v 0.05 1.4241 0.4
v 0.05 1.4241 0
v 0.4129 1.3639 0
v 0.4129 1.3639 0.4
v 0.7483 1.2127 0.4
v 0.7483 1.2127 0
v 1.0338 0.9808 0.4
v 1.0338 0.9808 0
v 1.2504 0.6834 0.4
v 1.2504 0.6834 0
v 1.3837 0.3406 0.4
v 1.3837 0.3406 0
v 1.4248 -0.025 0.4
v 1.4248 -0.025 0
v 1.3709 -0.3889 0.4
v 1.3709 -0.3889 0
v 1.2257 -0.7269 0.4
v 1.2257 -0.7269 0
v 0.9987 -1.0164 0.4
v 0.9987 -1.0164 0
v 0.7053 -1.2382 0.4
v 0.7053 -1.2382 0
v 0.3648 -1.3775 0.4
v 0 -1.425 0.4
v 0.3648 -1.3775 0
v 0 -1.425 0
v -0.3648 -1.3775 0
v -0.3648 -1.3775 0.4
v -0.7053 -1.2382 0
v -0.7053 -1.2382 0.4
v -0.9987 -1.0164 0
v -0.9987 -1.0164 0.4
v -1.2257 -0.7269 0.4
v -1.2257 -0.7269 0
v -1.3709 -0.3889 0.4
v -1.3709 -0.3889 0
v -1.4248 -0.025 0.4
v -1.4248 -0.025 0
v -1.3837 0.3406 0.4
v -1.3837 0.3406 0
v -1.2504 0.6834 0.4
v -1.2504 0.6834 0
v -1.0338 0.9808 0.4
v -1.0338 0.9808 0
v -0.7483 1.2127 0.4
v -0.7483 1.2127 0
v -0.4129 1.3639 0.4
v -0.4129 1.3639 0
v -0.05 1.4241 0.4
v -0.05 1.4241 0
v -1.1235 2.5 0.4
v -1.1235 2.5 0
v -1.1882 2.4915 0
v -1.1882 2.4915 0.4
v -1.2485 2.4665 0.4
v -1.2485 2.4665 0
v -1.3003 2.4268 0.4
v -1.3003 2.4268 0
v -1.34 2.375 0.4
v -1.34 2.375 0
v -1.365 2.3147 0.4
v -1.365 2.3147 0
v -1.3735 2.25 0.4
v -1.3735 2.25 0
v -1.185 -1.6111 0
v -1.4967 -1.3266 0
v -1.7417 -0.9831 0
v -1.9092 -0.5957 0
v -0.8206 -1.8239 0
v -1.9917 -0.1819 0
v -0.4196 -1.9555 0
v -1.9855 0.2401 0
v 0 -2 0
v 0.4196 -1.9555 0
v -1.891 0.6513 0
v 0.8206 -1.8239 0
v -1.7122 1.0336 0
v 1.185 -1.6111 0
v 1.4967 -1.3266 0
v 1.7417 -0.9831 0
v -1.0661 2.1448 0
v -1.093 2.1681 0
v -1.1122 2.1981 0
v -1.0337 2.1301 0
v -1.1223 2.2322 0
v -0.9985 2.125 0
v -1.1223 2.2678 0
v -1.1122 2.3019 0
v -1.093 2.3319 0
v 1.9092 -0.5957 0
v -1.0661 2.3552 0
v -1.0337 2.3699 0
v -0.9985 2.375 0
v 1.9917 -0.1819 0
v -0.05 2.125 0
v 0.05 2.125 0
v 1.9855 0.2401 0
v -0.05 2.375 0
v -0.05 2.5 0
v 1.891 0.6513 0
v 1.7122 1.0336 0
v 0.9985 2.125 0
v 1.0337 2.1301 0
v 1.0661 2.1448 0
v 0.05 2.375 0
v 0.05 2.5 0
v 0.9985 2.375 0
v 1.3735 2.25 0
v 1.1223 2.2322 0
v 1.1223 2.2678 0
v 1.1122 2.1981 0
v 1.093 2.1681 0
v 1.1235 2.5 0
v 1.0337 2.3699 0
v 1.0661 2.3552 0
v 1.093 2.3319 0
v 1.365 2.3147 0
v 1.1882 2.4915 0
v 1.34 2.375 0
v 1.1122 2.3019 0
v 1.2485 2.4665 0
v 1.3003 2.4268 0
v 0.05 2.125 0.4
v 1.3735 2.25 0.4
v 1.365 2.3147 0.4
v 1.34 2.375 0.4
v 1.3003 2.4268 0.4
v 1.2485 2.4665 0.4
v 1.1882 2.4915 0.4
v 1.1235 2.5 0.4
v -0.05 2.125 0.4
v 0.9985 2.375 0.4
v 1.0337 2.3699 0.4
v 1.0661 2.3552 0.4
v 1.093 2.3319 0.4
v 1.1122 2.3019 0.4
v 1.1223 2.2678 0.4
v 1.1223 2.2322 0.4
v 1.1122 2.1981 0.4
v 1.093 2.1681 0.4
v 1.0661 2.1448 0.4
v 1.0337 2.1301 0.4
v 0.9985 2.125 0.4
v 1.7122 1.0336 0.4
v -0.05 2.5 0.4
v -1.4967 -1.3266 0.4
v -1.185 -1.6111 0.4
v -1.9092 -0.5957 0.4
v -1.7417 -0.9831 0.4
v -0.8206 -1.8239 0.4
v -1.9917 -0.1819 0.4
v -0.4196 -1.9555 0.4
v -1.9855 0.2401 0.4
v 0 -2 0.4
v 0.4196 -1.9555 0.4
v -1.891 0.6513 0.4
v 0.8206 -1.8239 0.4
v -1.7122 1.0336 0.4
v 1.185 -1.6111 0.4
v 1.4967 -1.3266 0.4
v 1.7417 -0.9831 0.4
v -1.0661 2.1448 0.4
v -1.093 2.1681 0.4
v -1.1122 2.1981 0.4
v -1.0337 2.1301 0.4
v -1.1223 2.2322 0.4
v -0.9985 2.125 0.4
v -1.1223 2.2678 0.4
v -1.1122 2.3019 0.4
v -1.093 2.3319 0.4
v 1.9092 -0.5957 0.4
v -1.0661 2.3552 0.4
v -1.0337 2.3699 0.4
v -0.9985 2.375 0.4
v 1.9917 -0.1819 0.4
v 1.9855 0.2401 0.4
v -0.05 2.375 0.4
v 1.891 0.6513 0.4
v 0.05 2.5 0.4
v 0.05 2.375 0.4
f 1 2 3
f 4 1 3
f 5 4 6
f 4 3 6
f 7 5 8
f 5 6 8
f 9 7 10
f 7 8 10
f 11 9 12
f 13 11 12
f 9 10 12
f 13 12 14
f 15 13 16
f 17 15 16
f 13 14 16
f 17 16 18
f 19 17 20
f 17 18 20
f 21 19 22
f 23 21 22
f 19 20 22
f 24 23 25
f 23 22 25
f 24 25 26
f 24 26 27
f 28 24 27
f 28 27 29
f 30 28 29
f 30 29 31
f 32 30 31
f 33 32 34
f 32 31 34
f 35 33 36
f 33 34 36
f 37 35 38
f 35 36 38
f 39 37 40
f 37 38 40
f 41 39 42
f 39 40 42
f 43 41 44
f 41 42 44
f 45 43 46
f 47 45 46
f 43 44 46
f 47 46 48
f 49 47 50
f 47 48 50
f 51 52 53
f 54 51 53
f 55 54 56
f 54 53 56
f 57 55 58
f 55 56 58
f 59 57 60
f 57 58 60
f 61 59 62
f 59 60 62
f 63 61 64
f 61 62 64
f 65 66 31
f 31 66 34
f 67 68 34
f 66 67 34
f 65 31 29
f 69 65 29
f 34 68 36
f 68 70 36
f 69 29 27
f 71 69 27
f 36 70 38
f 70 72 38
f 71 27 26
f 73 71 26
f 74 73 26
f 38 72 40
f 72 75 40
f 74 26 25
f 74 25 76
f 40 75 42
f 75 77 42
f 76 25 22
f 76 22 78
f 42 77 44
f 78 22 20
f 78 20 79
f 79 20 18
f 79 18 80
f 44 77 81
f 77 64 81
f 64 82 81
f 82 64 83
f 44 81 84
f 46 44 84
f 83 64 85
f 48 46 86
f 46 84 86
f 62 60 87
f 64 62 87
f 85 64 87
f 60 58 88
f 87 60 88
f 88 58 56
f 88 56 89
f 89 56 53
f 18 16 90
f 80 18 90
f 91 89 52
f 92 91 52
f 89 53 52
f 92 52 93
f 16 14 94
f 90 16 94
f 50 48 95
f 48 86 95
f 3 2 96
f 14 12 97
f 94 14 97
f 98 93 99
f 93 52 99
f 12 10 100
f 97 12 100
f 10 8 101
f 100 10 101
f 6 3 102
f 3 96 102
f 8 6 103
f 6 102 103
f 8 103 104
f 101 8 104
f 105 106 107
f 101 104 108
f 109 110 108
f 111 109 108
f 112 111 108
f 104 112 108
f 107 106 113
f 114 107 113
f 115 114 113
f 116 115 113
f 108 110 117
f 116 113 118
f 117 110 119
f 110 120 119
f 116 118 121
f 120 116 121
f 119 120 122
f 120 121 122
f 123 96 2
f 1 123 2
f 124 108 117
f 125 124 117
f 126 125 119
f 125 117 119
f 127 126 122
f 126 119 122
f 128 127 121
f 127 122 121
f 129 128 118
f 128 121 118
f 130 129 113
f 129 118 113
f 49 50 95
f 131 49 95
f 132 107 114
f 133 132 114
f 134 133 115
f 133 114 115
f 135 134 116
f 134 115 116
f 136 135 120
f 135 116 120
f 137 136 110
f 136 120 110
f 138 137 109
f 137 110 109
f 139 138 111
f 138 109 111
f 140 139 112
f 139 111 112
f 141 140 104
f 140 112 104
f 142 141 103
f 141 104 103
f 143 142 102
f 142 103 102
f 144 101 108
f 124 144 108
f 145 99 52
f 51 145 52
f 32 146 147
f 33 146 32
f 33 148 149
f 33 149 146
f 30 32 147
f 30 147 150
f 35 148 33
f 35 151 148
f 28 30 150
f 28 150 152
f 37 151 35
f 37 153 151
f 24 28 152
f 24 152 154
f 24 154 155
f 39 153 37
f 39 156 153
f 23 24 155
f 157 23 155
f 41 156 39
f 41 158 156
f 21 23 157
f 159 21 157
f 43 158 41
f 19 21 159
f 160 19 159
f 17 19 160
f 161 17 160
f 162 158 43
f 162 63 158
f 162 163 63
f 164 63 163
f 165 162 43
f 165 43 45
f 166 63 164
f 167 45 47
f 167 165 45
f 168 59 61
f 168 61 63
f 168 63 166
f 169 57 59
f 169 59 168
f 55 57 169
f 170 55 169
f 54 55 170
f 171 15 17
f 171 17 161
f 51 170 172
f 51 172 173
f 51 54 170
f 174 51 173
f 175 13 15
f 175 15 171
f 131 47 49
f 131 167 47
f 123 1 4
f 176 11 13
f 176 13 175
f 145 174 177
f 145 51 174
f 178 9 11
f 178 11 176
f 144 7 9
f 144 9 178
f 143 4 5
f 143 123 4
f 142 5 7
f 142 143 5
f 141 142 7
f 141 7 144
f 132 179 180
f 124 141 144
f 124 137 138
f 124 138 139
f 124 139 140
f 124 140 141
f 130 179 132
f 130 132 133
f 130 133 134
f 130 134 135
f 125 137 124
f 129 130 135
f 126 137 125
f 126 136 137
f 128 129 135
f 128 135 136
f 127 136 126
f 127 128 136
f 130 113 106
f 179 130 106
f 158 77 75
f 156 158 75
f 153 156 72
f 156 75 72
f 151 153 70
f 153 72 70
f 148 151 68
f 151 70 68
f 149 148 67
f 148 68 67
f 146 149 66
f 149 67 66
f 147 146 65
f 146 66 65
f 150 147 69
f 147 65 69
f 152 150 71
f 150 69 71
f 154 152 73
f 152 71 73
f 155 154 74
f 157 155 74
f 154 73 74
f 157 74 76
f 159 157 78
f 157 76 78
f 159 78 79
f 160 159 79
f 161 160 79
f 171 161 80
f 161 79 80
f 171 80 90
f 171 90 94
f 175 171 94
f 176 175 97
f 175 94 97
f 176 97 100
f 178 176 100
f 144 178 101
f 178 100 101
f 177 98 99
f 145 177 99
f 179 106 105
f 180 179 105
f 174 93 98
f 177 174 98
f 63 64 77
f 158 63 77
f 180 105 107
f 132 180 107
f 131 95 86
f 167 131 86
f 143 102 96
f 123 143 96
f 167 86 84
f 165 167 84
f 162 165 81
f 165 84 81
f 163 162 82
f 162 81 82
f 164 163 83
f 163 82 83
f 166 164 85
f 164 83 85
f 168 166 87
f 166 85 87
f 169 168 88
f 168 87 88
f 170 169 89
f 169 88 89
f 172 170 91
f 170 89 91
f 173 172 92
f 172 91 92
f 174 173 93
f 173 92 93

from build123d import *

# Parameters (mm, degrees)
BOSS_EXTRUDE2_DEPTH = 0.4


with BuildPart() as part:
    # Sketch1 → Boss-Extrude2 (new body)
    with BuildSketch(Plane.XY):
        with BuildLine():
            ThreePointArc((0.05, 1.424122537), (0, -1.425), (-0.05, 1.424122537))
            Line((-0.05, 1.424122537), (-0.05, 2.125))
            Line((-0.05, 2.125), (-0.998523005, 2.125))
            ThreePointArc((-0.998523005, 2.125), (-1.123523005, 2.25), (-0.998523005, 2.375))
            Line((-0.998523005, 2.375), (-0.05, 2.375))
            Line((-0.05, 2.375), (-0.05, 2.5))
            Line((-0.05, 2.5), (-1.123523005, 2.5))
            ThreePointArc((-1.123523005, 2.5), (-1.3002997, 2.426776695), (-1.373523005, 2.25))
            Line((-1.373523005, 2.25), (-1.712208735, 1.033605944))
            ThreePointArc((-1.712208735, 1.033605944), (0, -2), (1.712208735, 1.033605944))
            Line((1.712208735, 1.033605944), (1.373523005, 2.25))
            ThreePointArc((1.373523005, 2.25), (1.3002997, 2.426776695), (1.123523005, 2.5))
            Line((1.123523005, 2.5), (0.05, 2.5))
            Line((0.05, 2.5), (0.05, 2.375))
            Line((0.05, 2.375), (0.998523005, 2.375))
            ThreePointArc((0.998523005, 2.375), (1.123523005, 2.25), (0.998523005, 2.125))
            Line((0.998523005, 2.125), (0.05, 2.125))
            Line((0.05, 2.125), (0.05, 1.424122537))
        make_face()
    extrude(amount=BOSS_EXTRUDE2_DEPTH)


solid = part.part
